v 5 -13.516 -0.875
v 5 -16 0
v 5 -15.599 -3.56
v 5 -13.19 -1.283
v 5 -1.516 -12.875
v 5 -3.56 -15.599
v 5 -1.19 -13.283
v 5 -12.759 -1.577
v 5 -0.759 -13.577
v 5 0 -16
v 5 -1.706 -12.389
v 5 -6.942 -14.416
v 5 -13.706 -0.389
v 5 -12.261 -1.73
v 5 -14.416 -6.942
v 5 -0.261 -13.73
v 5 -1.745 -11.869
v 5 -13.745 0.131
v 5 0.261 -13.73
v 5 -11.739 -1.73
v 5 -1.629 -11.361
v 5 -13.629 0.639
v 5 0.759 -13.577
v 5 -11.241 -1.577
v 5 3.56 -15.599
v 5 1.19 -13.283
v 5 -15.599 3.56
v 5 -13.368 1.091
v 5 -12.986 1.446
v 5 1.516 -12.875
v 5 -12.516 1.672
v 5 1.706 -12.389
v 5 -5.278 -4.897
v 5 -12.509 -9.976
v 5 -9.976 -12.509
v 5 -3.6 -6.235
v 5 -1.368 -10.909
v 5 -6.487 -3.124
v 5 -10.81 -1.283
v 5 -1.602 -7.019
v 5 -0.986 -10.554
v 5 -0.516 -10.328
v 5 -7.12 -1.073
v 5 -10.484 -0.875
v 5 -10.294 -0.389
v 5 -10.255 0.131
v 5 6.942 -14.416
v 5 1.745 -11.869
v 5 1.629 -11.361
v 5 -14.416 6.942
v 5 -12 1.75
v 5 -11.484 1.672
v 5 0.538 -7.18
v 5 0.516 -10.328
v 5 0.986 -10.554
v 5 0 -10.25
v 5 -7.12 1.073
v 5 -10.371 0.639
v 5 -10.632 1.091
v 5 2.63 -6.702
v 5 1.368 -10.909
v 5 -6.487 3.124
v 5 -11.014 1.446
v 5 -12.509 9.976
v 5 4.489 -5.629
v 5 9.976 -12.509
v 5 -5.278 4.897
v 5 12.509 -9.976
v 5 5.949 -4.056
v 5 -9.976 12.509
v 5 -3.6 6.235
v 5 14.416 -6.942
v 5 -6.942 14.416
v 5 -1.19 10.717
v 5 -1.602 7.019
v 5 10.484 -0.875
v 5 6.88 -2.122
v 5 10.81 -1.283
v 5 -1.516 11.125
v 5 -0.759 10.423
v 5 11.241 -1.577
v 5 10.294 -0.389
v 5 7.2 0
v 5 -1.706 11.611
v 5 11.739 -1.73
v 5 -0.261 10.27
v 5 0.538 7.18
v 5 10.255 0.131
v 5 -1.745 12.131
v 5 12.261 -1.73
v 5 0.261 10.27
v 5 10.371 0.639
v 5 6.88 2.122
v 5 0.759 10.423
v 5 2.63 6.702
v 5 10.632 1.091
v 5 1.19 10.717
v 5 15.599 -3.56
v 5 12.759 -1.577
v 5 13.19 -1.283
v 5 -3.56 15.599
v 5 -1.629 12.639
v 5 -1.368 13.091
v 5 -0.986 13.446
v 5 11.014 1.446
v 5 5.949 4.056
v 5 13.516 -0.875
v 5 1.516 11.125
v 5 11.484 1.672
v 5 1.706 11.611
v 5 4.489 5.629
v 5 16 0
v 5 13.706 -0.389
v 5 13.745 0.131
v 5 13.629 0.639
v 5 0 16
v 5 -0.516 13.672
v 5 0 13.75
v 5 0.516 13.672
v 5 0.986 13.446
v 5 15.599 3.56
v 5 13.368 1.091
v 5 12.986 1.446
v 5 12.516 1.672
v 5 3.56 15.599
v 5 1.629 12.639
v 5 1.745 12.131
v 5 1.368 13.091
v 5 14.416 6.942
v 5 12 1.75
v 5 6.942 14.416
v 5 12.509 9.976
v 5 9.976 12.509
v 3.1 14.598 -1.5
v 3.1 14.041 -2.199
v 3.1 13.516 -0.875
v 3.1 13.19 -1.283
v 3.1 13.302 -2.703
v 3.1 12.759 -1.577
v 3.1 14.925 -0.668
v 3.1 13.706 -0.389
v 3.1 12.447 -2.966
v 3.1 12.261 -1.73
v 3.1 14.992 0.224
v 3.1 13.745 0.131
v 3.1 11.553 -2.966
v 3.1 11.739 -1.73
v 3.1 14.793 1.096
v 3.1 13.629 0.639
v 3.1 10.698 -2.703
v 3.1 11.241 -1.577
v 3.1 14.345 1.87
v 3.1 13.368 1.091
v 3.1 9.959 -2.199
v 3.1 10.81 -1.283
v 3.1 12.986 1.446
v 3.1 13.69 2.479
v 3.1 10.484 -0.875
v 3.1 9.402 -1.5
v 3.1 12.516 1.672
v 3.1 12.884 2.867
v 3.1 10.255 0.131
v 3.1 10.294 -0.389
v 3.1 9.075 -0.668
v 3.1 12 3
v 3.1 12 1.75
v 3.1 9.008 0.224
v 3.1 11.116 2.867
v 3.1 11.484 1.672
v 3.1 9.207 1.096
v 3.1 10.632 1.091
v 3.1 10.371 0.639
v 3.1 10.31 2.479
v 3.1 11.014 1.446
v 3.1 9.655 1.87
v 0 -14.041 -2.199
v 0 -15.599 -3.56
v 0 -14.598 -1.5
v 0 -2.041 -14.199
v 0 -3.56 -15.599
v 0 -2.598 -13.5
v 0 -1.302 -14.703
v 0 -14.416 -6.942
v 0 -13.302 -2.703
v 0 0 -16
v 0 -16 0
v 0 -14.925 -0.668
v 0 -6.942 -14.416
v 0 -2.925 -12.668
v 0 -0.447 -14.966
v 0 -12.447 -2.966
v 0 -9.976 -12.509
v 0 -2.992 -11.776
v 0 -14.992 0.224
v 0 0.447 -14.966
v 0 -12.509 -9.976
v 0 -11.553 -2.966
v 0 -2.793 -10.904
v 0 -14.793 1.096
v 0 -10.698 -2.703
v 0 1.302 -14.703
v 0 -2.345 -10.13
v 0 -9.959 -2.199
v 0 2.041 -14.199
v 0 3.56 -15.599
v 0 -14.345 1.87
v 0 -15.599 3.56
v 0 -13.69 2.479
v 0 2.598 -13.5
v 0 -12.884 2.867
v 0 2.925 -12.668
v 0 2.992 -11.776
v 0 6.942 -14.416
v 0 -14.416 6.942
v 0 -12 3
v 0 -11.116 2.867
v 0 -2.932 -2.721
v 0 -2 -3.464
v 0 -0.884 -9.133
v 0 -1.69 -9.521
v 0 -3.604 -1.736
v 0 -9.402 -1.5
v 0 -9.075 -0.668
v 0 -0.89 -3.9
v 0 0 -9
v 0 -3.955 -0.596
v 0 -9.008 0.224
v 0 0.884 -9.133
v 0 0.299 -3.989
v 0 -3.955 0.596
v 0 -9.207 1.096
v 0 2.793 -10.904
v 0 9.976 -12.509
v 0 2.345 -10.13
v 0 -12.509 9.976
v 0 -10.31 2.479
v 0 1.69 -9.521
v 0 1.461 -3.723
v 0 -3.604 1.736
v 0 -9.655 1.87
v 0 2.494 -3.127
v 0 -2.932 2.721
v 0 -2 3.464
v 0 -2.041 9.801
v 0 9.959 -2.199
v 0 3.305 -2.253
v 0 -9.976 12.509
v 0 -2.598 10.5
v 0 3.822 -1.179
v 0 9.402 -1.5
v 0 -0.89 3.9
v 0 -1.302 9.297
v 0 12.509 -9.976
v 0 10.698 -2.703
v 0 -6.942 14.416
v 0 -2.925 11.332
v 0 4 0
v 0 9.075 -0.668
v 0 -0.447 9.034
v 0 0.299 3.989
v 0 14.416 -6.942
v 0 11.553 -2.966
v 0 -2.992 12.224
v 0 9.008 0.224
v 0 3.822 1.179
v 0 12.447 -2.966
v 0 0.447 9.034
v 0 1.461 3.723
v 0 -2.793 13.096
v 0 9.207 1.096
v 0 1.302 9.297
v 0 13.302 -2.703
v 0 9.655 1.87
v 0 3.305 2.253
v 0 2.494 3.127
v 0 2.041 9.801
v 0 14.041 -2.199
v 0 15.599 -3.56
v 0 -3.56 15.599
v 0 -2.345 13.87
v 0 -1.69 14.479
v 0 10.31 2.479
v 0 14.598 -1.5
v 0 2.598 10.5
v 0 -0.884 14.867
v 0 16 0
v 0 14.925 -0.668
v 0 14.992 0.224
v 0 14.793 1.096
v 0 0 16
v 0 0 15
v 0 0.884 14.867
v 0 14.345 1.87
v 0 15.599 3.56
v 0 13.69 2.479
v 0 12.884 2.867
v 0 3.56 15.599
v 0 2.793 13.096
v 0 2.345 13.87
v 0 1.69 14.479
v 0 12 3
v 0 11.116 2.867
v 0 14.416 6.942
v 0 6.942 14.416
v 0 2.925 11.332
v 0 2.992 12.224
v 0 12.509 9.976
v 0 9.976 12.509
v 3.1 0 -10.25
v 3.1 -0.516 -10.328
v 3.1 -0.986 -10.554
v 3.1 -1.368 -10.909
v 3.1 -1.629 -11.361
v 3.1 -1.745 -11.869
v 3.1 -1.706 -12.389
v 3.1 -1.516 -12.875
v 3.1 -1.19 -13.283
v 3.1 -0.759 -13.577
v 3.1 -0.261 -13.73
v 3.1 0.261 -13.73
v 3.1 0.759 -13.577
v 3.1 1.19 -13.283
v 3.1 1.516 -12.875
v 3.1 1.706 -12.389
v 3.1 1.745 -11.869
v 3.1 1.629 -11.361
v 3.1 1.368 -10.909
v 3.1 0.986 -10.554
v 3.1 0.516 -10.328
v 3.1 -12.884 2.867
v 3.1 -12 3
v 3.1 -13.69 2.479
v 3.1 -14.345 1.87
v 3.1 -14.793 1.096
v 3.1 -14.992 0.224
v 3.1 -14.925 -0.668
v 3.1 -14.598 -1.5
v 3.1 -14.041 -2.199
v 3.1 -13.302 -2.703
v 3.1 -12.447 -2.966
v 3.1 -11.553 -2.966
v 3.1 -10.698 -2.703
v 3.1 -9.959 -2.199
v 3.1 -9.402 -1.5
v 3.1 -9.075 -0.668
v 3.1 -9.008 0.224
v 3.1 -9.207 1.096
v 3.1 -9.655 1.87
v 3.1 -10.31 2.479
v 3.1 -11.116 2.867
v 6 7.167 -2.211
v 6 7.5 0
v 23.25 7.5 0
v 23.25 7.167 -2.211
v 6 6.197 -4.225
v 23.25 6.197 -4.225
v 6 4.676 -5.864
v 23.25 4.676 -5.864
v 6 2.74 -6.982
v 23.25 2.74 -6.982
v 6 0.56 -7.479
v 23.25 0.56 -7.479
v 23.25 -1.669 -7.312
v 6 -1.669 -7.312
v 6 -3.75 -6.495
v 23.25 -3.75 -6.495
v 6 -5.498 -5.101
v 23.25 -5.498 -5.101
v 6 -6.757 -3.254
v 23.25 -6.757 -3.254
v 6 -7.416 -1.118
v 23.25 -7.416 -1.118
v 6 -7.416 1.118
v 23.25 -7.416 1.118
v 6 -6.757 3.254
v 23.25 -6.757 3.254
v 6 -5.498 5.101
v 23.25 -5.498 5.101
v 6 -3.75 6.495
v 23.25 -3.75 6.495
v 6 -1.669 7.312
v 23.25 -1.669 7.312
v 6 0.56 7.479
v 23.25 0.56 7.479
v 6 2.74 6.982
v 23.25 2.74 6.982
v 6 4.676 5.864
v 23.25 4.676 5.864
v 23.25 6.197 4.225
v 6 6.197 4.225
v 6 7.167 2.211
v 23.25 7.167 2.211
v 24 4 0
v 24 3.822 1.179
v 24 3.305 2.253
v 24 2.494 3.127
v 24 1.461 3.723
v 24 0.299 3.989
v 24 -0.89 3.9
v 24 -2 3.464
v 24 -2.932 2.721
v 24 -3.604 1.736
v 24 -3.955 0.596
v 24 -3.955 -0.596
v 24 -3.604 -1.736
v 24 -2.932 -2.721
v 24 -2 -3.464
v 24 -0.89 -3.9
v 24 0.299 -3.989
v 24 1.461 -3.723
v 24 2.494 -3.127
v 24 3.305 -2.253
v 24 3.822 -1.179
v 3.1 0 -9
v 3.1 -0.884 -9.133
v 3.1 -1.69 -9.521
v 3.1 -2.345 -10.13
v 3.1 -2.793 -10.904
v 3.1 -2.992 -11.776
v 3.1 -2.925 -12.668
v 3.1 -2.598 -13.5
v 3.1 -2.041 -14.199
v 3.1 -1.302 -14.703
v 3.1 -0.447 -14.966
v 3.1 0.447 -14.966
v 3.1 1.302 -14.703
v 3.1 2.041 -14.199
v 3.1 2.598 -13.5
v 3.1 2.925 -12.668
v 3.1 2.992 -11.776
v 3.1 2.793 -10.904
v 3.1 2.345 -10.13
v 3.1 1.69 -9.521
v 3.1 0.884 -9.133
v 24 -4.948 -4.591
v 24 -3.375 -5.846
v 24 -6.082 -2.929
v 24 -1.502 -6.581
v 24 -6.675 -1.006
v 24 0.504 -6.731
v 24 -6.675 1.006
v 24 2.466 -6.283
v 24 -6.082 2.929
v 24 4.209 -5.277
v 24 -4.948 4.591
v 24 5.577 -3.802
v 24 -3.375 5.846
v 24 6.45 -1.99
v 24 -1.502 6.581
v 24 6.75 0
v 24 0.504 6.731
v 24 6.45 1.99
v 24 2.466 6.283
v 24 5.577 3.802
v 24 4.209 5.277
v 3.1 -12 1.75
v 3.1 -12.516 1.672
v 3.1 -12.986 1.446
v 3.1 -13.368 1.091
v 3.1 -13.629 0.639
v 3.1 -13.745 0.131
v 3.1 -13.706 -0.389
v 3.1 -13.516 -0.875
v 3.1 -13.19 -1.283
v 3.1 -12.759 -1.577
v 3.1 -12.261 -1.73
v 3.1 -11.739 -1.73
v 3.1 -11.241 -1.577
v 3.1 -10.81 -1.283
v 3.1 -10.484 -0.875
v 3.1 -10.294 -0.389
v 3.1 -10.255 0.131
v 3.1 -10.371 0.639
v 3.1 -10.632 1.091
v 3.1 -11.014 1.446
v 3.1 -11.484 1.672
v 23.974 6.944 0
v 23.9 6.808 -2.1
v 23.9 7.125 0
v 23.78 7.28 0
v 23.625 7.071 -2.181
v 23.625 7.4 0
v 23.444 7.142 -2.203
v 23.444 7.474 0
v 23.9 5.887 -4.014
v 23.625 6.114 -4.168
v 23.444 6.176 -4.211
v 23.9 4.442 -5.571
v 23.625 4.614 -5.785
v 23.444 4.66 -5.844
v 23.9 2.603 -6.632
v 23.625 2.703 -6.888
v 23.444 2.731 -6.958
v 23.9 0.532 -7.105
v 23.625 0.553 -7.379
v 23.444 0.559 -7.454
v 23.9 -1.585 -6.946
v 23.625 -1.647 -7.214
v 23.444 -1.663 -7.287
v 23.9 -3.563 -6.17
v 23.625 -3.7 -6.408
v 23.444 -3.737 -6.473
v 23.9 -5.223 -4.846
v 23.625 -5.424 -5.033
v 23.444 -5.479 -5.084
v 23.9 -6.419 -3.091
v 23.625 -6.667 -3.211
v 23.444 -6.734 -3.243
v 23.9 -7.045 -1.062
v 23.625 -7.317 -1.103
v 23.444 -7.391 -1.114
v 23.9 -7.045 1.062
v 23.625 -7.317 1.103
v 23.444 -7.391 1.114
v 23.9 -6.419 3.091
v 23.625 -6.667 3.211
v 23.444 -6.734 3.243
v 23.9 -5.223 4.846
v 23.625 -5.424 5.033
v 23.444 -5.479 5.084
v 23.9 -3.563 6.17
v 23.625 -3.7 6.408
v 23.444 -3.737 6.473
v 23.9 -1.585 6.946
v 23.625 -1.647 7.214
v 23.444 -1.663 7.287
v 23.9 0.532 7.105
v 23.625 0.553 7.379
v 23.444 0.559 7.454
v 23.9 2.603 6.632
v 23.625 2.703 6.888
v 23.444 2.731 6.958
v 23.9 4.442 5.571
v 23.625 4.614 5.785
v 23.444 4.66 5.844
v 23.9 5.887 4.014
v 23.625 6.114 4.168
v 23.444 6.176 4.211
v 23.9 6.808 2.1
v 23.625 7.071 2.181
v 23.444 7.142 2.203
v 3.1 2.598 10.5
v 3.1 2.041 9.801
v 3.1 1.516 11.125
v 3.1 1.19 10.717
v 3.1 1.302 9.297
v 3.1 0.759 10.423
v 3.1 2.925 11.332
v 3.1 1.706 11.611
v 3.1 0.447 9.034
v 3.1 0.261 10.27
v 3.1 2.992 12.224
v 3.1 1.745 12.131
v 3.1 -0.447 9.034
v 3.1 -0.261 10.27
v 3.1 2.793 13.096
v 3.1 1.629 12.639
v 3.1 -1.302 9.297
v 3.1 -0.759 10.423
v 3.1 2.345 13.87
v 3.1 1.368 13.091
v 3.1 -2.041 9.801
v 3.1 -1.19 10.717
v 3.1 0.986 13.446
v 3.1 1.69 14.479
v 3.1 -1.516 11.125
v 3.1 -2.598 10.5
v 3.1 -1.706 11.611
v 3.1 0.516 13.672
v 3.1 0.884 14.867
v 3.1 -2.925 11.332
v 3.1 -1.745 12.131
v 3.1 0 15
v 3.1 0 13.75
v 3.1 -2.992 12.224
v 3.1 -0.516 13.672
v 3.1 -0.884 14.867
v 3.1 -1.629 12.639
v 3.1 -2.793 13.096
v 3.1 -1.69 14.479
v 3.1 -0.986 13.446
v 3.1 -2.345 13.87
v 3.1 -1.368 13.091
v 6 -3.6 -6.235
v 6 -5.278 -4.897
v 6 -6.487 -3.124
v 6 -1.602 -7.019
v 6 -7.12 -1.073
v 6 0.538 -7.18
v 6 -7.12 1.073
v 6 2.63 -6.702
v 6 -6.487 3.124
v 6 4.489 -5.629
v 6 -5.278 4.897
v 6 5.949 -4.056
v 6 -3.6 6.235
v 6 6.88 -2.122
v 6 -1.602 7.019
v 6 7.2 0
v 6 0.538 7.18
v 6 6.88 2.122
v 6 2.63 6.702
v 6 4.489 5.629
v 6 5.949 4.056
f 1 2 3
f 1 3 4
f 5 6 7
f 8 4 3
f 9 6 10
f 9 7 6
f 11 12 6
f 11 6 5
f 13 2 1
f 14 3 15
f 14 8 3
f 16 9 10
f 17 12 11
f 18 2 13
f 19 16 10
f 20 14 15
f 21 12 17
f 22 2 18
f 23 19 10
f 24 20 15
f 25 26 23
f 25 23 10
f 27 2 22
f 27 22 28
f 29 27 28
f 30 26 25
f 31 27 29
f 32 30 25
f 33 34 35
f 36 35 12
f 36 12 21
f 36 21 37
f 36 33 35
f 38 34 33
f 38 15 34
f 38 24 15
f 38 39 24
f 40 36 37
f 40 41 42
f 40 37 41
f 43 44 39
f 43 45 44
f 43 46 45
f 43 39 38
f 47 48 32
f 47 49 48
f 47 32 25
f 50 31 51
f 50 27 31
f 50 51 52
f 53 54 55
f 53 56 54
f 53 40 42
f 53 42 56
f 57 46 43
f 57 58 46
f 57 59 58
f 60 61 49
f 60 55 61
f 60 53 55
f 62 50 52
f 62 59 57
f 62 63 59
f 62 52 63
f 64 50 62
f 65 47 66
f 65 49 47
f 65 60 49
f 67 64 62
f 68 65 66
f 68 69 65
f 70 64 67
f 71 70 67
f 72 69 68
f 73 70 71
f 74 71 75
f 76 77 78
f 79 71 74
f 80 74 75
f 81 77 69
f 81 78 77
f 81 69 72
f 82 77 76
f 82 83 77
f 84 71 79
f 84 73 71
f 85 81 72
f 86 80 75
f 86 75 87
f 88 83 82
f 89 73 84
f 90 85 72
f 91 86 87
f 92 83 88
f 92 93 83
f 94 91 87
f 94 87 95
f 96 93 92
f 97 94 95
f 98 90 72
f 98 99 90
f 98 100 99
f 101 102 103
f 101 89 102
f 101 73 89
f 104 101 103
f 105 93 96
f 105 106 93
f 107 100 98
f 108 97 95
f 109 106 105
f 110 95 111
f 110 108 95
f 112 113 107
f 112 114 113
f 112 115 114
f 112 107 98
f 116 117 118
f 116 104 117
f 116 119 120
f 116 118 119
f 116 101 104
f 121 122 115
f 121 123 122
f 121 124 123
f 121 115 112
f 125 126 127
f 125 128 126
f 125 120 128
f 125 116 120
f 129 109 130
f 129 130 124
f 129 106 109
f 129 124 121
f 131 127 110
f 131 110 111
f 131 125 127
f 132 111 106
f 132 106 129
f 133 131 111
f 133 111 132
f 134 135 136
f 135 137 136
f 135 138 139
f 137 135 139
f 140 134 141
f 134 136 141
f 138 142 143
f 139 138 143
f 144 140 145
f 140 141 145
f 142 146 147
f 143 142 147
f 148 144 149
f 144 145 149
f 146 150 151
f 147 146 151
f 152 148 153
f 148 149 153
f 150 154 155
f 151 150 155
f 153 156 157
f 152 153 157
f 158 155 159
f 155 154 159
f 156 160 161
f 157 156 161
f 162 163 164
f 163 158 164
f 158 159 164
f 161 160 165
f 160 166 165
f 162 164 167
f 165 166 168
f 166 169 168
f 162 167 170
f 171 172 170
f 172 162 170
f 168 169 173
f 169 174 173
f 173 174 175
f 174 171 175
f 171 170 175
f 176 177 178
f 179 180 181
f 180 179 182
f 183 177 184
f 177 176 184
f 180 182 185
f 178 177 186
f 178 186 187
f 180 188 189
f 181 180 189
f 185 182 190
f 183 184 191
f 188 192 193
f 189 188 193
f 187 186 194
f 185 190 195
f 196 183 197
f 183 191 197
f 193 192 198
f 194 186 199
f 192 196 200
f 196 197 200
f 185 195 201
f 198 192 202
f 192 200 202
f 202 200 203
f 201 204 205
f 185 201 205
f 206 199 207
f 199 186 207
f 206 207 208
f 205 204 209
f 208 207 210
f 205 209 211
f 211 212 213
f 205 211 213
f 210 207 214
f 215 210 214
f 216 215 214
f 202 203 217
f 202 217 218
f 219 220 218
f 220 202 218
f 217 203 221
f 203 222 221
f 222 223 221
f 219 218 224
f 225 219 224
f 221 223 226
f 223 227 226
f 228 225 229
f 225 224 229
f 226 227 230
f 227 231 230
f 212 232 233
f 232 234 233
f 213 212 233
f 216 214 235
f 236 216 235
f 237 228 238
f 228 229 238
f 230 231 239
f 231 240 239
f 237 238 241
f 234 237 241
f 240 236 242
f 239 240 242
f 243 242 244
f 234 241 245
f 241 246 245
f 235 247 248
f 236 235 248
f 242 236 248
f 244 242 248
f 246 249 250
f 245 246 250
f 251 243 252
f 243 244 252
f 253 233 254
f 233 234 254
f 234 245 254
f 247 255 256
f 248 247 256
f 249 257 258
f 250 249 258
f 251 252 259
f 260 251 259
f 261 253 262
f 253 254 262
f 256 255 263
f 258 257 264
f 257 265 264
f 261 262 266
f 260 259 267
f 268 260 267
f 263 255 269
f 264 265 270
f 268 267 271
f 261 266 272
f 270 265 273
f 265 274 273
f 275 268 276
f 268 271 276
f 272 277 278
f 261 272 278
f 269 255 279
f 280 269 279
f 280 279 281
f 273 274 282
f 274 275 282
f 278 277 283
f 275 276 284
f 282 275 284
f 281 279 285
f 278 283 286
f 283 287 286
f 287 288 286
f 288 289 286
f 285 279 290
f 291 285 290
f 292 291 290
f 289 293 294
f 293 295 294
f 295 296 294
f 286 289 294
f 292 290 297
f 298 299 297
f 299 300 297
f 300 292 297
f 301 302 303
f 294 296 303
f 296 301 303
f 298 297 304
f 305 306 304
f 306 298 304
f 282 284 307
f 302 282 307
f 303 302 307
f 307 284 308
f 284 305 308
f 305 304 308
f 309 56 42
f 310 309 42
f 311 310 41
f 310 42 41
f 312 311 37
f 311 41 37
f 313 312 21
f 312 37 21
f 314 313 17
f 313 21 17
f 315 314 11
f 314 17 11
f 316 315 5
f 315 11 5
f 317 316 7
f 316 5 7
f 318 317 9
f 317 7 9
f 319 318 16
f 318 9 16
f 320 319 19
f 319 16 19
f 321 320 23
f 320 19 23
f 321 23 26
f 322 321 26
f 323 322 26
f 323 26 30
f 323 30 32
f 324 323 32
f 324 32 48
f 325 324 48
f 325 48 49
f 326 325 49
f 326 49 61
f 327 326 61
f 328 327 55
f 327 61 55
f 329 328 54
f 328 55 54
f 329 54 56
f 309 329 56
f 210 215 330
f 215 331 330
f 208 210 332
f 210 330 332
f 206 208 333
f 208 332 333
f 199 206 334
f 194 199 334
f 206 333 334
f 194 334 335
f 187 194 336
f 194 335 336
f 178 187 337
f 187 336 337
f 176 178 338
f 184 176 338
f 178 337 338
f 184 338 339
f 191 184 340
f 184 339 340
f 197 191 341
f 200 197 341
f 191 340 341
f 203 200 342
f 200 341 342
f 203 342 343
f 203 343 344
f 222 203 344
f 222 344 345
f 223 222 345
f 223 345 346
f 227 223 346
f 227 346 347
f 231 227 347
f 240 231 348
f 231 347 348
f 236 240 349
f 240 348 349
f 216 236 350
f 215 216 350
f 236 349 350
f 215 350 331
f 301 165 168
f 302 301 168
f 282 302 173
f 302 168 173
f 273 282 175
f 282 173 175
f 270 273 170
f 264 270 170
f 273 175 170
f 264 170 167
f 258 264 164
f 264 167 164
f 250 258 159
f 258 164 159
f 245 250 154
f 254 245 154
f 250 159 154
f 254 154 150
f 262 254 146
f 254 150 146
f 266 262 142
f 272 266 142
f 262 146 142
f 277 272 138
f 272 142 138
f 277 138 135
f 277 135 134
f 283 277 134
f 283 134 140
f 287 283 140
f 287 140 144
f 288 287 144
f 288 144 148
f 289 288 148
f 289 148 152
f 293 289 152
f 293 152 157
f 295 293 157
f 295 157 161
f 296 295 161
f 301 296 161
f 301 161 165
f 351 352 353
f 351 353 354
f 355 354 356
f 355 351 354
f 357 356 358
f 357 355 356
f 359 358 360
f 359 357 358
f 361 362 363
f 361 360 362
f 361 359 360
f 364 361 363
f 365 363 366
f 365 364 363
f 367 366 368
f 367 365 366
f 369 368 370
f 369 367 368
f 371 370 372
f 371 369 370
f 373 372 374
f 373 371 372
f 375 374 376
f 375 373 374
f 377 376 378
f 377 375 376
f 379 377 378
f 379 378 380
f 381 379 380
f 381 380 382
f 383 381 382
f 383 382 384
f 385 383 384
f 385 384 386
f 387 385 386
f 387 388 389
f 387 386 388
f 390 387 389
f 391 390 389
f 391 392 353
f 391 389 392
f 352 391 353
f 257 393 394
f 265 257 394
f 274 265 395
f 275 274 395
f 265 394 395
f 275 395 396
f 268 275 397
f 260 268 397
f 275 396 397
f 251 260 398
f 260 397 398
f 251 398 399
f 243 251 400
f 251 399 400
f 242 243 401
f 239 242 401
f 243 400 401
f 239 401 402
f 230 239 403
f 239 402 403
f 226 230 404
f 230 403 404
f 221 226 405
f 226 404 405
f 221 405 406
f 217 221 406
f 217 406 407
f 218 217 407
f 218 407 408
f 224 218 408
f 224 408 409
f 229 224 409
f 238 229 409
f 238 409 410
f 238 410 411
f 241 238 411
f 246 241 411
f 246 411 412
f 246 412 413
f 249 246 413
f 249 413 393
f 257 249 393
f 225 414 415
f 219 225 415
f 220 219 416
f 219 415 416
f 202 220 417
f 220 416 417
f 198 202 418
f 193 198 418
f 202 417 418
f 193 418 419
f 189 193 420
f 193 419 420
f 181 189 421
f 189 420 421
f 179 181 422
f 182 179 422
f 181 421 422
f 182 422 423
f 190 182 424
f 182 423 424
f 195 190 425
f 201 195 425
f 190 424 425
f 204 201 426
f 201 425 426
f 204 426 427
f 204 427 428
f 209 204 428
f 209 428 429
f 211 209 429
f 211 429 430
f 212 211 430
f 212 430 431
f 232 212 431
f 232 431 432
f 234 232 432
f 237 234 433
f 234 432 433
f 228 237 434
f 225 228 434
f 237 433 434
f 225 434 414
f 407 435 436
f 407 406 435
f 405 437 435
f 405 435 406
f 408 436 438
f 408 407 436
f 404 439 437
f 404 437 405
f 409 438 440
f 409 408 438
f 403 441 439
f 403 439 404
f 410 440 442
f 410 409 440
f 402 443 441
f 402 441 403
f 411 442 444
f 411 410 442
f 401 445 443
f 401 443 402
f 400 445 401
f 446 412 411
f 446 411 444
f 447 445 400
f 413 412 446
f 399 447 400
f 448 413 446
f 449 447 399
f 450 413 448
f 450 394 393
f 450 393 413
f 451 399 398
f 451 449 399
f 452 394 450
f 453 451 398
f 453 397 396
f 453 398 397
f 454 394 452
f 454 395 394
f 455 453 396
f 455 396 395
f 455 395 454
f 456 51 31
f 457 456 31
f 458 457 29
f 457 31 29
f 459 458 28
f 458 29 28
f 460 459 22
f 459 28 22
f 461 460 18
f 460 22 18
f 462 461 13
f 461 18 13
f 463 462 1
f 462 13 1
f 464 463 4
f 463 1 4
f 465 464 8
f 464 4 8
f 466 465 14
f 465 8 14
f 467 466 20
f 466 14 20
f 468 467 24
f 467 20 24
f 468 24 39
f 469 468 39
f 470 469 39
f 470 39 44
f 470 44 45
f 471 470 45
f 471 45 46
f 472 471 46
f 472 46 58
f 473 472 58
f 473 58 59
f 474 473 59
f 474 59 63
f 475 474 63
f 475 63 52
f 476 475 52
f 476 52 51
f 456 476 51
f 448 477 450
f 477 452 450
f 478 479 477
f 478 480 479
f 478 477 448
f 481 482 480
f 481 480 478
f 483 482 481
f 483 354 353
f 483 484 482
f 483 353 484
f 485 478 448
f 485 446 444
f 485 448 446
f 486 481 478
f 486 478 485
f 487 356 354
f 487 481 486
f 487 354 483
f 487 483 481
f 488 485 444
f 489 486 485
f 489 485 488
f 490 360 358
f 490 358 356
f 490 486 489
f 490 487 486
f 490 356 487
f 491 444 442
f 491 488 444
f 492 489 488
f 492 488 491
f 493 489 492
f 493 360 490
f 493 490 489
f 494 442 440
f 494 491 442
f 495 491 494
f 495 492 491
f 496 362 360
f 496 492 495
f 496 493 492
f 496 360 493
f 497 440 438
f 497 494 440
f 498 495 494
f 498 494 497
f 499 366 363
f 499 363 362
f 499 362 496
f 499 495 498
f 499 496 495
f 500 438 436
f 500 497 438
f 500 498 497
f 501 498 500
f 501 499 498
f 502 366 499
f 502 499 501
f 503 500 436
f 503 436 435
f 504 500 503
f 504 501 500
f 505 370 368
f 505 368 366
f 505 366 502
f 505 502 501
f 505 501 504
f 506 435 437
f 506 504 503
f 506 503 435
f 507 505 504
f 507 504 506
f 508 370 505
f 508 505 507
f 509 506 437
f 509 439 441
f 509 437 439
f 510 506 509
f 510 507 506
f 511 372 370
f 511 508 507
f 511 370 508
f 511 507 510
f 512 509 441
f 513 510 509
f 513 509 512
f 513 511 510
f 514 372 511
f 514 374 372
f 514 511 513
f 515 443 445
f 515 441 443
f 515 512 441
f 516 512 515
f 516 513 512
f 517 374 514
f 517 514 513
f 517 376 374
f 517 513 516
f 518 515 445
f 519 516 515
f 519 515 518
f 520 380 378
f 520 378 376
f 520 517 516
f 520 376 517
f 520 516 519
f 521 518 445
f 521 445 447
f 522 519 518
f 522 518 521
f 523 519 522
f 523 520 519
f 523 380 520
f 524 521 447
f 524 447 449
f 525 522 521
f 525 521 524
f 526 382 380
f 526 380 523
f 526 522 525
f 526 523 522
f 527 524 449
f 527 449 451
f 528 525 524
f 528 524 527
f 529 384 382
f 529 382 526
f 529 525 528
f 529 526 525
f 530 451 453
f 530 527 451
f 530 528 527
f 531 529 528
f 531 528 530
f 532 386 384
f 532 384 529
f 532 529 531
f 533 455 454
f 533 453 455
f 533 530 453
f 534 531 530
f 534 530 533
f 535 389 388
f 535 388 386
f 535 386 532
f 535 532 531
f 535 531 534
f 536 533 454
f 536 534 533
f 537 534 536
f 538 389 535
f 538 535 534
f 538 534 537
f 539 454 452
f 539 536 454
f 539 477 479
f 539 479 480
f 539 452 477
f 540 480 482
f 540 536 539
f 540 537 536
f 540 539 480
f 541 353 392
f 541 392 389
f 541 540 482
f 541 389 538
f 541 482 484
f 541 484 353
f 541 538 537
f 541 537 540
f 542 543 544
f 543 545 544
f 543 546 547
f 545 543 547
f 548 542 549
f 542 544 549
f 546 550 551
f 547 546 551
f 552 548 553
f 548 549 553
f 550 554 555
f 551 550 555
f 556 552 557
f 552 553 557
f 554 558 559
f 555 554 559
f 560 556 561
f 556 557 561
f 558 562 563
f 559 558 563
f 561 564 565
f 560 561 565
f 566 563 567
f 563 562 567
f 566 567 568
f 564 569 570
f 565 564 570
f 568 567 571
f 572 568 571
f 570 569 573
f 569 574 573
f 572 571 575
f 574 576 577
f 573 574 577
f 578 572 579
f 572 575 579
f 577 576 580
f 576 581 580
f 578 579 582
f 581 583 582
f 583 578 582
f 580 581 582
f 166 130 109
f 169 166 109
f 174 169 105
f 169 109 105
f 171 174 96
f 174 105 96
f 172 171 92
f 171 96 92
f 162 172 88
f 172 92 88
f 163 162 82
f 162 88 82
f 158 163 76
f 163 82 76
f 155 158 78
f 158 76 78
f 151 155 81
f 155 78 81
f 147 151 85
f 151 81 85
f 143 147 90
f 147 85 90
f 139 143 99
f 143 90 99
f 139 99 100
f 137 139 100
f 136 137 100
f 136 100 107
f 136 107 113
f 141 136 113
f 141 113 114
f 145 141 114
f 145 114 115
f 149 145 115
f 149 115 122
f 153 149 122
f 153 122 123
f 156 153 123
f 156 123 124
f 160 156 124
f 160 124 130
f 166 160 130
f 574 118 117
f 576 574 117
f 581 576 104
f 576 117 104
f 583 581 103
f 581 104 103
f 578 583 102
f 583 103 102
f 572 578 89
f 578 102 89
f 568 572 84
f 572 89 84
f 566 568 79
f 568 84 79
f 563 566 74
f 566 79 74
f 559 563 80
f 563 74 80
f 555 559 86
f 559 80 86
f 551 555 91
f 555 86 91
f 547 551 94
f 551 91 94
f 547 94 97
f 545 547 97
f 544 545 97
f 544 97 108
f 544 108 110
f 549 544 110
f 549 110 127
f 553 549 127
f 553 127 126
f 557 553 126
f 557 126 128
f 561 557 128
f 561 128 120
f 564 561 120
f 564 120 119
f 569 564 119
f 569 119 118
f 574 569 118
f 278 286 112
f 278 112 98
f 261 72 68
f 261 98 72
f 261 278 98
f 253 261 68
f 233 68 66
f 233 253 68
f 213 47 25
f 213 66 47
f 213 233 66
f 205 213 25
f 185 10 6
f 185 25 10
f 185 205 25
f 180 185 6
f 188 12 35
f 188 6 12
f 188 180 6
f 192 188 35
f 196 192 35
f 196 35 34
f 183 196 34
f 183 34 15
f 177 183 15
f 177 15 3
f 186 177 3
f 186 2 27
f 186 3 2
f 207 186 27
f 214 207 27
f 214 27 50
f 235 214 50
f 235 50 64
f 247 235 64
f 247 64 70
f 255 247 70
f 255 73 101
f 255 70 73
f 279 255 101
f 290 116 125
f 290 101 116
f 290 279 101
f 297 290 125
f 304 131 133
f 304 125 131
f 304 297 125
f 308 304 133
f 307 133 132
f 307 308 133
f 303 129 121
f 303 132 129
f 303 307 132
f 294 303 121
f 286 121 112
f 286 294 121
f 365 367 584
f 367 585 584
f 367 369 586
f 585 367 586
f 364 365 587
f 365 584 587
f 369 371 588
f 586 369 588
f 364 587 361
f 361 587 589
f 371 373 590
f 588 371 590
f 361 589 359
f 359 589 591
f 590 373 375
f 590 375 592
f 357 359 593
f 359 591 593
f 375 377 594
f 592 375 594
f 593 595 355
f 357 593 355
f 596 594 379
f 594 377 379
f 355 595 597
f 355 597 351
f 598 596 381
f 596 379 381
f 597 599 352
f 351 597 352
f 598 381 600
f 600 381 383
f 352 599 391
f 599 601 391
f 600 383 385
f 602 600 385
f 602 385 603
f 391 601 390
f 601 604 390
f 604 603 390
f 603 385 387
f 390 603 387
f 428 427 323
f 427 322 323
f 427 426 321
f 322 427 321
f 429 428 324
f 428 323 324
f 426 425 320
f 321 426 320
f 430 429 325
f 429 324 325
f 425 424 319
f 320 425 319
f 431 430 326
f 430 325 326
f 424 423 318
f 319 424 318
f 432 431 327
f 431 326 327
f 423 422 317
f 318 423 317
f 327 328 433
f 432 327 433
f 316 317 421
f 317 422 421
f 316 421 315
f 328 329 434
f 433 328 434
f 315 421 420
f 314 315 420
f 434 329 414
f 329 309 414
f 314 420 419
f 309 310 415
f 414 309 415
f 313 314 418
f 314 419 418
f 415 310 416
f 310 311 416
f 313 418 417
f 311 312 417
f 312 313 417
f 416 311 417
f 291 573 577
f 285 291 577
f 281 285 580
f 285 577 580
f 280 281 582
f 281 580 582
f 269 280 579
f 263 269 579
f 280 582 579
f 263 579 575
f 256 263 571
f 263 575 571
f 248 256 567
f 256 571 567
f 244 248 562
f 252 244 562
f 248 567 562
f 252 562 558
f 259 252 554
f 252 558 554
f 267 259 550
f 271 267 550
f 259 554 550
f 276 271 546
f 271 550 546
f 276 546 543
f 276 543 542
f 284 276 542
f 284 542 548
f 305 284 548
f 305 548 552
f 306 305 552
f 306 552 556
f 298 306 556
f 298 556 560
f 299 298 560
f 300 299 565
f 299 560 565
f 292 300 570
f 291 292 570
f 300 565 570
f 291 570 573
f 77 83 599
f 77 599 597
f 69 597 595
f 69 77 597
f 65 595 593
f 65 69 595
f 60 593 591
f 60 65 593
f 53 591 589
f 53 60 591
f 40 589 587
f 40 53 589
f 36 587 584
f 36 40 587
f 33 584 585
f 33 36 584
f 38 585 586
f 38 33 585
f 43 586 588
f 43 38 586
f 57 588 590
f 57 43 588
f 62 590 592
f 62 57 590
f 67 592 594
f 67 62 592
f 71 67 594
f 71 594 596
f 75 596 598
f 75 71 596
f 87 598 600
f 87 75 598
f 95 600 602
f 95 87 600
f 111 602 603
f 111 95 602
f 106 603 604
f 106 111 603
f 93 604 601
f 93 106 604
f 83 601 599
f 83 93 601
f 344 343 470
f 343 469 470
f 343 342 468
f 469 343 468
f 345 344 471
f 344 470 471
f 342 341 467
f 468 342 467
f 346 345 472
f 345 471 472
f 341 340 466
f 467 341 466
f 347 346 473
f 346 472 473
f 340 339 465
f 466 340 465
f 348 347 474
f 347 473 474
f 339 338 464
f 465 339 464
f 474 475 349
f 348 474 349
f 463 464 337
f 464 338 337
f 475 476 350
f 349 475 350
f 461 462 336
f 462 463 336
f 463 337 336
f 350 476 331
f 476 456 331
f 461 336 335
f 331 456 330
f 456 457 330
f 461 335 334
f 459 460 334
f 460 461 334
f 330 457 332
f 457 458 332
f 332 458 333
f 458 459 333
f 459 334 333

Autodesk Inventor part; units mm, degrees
sketch "Sketch_1" plane through (0, 0, 0) normal (0, 0, 1) x (1, 0, 0)
  line L0 (24, 0) -> (0, 0)
  line L1 (0, 4) -> (24, 4)
  line L2 (24, 4) -> (24, 6.75)
  arc A0 (24, 6.75) -> (23.25, 7.5) centre (23.25, 6.75) ccw
  line L3 (23.25, 7.5) -> (6, 7.5)
  line L4 (6, 7.5) -> (6, 7.2)
  line L5 (6, 7.2) -> (5, 7.2)
  line L6 (5, 7.2) -> (5, 16)
  line L7 (5, 16) -> (0, 16)
  line L8 (0, 16) -> (0, 4)
revolve "Revolution1" add sketch "Sketch_1" angle 360 about axis through (24, 0, 0) along (1, 0, 0)
sketch "Sketch2" plane through (0, 0, 0) normal (-1, 0, 0) x (0, 0, 1)
  point P0 (0, 12)
hole "Hole1" at (0, 12, 0) direction (1, 0, 0) diameter 3.5 depth 5 counterbore diameter 6 counterbore depth 3.1
sketch "Sketch3" plane through (0, 0, 0) normal (-1, 0, 0) x (0, 0, 1)
  point P0 (0, -12)
hole "Hole2" at (0, -12, 0) direction (1, 0, 0) diameter 3.5 depth 5 counterbore diameter 6 counterbore depth 3.1
sketch "Sketch4" plane through (0, 0, 0) normal (-1, 0, 0) x (0, 0, 1)
  point P0 (-12, 0)
hole "Hole3" at (0, 0, -12) direction (1, 0, 0) diameter 3.5 depth 5 counterbore diameter 6 counterbore depth 3.1
sketch "Sketch5" plane through (0, 0, 0) normal (-1, 0, 0) x (0, 0, 1)
  point P0 (12, 0)
hole "Hole4" at (0, 0, 12) direction (1, 0, 0) diameter 3.5 depth 5 counterbore diameter 6 counterbore depth 3.1
ref_plane "Combination_Module_XY" through (0, 0, 0) normal (1, 0, 0) x (0, 0, -1)
ref_plane "Combination_Module_YZ" through (0, 0, 0) normal (0, 0, -1) x (0, 1, 0)
ref_plane "Combination_Module_ZX" through (0, 0, 0) normal (0, 1, 0) x (1, 0, 0)
properties part number "LHFR-N8" material "鉄、鋳鉄"
